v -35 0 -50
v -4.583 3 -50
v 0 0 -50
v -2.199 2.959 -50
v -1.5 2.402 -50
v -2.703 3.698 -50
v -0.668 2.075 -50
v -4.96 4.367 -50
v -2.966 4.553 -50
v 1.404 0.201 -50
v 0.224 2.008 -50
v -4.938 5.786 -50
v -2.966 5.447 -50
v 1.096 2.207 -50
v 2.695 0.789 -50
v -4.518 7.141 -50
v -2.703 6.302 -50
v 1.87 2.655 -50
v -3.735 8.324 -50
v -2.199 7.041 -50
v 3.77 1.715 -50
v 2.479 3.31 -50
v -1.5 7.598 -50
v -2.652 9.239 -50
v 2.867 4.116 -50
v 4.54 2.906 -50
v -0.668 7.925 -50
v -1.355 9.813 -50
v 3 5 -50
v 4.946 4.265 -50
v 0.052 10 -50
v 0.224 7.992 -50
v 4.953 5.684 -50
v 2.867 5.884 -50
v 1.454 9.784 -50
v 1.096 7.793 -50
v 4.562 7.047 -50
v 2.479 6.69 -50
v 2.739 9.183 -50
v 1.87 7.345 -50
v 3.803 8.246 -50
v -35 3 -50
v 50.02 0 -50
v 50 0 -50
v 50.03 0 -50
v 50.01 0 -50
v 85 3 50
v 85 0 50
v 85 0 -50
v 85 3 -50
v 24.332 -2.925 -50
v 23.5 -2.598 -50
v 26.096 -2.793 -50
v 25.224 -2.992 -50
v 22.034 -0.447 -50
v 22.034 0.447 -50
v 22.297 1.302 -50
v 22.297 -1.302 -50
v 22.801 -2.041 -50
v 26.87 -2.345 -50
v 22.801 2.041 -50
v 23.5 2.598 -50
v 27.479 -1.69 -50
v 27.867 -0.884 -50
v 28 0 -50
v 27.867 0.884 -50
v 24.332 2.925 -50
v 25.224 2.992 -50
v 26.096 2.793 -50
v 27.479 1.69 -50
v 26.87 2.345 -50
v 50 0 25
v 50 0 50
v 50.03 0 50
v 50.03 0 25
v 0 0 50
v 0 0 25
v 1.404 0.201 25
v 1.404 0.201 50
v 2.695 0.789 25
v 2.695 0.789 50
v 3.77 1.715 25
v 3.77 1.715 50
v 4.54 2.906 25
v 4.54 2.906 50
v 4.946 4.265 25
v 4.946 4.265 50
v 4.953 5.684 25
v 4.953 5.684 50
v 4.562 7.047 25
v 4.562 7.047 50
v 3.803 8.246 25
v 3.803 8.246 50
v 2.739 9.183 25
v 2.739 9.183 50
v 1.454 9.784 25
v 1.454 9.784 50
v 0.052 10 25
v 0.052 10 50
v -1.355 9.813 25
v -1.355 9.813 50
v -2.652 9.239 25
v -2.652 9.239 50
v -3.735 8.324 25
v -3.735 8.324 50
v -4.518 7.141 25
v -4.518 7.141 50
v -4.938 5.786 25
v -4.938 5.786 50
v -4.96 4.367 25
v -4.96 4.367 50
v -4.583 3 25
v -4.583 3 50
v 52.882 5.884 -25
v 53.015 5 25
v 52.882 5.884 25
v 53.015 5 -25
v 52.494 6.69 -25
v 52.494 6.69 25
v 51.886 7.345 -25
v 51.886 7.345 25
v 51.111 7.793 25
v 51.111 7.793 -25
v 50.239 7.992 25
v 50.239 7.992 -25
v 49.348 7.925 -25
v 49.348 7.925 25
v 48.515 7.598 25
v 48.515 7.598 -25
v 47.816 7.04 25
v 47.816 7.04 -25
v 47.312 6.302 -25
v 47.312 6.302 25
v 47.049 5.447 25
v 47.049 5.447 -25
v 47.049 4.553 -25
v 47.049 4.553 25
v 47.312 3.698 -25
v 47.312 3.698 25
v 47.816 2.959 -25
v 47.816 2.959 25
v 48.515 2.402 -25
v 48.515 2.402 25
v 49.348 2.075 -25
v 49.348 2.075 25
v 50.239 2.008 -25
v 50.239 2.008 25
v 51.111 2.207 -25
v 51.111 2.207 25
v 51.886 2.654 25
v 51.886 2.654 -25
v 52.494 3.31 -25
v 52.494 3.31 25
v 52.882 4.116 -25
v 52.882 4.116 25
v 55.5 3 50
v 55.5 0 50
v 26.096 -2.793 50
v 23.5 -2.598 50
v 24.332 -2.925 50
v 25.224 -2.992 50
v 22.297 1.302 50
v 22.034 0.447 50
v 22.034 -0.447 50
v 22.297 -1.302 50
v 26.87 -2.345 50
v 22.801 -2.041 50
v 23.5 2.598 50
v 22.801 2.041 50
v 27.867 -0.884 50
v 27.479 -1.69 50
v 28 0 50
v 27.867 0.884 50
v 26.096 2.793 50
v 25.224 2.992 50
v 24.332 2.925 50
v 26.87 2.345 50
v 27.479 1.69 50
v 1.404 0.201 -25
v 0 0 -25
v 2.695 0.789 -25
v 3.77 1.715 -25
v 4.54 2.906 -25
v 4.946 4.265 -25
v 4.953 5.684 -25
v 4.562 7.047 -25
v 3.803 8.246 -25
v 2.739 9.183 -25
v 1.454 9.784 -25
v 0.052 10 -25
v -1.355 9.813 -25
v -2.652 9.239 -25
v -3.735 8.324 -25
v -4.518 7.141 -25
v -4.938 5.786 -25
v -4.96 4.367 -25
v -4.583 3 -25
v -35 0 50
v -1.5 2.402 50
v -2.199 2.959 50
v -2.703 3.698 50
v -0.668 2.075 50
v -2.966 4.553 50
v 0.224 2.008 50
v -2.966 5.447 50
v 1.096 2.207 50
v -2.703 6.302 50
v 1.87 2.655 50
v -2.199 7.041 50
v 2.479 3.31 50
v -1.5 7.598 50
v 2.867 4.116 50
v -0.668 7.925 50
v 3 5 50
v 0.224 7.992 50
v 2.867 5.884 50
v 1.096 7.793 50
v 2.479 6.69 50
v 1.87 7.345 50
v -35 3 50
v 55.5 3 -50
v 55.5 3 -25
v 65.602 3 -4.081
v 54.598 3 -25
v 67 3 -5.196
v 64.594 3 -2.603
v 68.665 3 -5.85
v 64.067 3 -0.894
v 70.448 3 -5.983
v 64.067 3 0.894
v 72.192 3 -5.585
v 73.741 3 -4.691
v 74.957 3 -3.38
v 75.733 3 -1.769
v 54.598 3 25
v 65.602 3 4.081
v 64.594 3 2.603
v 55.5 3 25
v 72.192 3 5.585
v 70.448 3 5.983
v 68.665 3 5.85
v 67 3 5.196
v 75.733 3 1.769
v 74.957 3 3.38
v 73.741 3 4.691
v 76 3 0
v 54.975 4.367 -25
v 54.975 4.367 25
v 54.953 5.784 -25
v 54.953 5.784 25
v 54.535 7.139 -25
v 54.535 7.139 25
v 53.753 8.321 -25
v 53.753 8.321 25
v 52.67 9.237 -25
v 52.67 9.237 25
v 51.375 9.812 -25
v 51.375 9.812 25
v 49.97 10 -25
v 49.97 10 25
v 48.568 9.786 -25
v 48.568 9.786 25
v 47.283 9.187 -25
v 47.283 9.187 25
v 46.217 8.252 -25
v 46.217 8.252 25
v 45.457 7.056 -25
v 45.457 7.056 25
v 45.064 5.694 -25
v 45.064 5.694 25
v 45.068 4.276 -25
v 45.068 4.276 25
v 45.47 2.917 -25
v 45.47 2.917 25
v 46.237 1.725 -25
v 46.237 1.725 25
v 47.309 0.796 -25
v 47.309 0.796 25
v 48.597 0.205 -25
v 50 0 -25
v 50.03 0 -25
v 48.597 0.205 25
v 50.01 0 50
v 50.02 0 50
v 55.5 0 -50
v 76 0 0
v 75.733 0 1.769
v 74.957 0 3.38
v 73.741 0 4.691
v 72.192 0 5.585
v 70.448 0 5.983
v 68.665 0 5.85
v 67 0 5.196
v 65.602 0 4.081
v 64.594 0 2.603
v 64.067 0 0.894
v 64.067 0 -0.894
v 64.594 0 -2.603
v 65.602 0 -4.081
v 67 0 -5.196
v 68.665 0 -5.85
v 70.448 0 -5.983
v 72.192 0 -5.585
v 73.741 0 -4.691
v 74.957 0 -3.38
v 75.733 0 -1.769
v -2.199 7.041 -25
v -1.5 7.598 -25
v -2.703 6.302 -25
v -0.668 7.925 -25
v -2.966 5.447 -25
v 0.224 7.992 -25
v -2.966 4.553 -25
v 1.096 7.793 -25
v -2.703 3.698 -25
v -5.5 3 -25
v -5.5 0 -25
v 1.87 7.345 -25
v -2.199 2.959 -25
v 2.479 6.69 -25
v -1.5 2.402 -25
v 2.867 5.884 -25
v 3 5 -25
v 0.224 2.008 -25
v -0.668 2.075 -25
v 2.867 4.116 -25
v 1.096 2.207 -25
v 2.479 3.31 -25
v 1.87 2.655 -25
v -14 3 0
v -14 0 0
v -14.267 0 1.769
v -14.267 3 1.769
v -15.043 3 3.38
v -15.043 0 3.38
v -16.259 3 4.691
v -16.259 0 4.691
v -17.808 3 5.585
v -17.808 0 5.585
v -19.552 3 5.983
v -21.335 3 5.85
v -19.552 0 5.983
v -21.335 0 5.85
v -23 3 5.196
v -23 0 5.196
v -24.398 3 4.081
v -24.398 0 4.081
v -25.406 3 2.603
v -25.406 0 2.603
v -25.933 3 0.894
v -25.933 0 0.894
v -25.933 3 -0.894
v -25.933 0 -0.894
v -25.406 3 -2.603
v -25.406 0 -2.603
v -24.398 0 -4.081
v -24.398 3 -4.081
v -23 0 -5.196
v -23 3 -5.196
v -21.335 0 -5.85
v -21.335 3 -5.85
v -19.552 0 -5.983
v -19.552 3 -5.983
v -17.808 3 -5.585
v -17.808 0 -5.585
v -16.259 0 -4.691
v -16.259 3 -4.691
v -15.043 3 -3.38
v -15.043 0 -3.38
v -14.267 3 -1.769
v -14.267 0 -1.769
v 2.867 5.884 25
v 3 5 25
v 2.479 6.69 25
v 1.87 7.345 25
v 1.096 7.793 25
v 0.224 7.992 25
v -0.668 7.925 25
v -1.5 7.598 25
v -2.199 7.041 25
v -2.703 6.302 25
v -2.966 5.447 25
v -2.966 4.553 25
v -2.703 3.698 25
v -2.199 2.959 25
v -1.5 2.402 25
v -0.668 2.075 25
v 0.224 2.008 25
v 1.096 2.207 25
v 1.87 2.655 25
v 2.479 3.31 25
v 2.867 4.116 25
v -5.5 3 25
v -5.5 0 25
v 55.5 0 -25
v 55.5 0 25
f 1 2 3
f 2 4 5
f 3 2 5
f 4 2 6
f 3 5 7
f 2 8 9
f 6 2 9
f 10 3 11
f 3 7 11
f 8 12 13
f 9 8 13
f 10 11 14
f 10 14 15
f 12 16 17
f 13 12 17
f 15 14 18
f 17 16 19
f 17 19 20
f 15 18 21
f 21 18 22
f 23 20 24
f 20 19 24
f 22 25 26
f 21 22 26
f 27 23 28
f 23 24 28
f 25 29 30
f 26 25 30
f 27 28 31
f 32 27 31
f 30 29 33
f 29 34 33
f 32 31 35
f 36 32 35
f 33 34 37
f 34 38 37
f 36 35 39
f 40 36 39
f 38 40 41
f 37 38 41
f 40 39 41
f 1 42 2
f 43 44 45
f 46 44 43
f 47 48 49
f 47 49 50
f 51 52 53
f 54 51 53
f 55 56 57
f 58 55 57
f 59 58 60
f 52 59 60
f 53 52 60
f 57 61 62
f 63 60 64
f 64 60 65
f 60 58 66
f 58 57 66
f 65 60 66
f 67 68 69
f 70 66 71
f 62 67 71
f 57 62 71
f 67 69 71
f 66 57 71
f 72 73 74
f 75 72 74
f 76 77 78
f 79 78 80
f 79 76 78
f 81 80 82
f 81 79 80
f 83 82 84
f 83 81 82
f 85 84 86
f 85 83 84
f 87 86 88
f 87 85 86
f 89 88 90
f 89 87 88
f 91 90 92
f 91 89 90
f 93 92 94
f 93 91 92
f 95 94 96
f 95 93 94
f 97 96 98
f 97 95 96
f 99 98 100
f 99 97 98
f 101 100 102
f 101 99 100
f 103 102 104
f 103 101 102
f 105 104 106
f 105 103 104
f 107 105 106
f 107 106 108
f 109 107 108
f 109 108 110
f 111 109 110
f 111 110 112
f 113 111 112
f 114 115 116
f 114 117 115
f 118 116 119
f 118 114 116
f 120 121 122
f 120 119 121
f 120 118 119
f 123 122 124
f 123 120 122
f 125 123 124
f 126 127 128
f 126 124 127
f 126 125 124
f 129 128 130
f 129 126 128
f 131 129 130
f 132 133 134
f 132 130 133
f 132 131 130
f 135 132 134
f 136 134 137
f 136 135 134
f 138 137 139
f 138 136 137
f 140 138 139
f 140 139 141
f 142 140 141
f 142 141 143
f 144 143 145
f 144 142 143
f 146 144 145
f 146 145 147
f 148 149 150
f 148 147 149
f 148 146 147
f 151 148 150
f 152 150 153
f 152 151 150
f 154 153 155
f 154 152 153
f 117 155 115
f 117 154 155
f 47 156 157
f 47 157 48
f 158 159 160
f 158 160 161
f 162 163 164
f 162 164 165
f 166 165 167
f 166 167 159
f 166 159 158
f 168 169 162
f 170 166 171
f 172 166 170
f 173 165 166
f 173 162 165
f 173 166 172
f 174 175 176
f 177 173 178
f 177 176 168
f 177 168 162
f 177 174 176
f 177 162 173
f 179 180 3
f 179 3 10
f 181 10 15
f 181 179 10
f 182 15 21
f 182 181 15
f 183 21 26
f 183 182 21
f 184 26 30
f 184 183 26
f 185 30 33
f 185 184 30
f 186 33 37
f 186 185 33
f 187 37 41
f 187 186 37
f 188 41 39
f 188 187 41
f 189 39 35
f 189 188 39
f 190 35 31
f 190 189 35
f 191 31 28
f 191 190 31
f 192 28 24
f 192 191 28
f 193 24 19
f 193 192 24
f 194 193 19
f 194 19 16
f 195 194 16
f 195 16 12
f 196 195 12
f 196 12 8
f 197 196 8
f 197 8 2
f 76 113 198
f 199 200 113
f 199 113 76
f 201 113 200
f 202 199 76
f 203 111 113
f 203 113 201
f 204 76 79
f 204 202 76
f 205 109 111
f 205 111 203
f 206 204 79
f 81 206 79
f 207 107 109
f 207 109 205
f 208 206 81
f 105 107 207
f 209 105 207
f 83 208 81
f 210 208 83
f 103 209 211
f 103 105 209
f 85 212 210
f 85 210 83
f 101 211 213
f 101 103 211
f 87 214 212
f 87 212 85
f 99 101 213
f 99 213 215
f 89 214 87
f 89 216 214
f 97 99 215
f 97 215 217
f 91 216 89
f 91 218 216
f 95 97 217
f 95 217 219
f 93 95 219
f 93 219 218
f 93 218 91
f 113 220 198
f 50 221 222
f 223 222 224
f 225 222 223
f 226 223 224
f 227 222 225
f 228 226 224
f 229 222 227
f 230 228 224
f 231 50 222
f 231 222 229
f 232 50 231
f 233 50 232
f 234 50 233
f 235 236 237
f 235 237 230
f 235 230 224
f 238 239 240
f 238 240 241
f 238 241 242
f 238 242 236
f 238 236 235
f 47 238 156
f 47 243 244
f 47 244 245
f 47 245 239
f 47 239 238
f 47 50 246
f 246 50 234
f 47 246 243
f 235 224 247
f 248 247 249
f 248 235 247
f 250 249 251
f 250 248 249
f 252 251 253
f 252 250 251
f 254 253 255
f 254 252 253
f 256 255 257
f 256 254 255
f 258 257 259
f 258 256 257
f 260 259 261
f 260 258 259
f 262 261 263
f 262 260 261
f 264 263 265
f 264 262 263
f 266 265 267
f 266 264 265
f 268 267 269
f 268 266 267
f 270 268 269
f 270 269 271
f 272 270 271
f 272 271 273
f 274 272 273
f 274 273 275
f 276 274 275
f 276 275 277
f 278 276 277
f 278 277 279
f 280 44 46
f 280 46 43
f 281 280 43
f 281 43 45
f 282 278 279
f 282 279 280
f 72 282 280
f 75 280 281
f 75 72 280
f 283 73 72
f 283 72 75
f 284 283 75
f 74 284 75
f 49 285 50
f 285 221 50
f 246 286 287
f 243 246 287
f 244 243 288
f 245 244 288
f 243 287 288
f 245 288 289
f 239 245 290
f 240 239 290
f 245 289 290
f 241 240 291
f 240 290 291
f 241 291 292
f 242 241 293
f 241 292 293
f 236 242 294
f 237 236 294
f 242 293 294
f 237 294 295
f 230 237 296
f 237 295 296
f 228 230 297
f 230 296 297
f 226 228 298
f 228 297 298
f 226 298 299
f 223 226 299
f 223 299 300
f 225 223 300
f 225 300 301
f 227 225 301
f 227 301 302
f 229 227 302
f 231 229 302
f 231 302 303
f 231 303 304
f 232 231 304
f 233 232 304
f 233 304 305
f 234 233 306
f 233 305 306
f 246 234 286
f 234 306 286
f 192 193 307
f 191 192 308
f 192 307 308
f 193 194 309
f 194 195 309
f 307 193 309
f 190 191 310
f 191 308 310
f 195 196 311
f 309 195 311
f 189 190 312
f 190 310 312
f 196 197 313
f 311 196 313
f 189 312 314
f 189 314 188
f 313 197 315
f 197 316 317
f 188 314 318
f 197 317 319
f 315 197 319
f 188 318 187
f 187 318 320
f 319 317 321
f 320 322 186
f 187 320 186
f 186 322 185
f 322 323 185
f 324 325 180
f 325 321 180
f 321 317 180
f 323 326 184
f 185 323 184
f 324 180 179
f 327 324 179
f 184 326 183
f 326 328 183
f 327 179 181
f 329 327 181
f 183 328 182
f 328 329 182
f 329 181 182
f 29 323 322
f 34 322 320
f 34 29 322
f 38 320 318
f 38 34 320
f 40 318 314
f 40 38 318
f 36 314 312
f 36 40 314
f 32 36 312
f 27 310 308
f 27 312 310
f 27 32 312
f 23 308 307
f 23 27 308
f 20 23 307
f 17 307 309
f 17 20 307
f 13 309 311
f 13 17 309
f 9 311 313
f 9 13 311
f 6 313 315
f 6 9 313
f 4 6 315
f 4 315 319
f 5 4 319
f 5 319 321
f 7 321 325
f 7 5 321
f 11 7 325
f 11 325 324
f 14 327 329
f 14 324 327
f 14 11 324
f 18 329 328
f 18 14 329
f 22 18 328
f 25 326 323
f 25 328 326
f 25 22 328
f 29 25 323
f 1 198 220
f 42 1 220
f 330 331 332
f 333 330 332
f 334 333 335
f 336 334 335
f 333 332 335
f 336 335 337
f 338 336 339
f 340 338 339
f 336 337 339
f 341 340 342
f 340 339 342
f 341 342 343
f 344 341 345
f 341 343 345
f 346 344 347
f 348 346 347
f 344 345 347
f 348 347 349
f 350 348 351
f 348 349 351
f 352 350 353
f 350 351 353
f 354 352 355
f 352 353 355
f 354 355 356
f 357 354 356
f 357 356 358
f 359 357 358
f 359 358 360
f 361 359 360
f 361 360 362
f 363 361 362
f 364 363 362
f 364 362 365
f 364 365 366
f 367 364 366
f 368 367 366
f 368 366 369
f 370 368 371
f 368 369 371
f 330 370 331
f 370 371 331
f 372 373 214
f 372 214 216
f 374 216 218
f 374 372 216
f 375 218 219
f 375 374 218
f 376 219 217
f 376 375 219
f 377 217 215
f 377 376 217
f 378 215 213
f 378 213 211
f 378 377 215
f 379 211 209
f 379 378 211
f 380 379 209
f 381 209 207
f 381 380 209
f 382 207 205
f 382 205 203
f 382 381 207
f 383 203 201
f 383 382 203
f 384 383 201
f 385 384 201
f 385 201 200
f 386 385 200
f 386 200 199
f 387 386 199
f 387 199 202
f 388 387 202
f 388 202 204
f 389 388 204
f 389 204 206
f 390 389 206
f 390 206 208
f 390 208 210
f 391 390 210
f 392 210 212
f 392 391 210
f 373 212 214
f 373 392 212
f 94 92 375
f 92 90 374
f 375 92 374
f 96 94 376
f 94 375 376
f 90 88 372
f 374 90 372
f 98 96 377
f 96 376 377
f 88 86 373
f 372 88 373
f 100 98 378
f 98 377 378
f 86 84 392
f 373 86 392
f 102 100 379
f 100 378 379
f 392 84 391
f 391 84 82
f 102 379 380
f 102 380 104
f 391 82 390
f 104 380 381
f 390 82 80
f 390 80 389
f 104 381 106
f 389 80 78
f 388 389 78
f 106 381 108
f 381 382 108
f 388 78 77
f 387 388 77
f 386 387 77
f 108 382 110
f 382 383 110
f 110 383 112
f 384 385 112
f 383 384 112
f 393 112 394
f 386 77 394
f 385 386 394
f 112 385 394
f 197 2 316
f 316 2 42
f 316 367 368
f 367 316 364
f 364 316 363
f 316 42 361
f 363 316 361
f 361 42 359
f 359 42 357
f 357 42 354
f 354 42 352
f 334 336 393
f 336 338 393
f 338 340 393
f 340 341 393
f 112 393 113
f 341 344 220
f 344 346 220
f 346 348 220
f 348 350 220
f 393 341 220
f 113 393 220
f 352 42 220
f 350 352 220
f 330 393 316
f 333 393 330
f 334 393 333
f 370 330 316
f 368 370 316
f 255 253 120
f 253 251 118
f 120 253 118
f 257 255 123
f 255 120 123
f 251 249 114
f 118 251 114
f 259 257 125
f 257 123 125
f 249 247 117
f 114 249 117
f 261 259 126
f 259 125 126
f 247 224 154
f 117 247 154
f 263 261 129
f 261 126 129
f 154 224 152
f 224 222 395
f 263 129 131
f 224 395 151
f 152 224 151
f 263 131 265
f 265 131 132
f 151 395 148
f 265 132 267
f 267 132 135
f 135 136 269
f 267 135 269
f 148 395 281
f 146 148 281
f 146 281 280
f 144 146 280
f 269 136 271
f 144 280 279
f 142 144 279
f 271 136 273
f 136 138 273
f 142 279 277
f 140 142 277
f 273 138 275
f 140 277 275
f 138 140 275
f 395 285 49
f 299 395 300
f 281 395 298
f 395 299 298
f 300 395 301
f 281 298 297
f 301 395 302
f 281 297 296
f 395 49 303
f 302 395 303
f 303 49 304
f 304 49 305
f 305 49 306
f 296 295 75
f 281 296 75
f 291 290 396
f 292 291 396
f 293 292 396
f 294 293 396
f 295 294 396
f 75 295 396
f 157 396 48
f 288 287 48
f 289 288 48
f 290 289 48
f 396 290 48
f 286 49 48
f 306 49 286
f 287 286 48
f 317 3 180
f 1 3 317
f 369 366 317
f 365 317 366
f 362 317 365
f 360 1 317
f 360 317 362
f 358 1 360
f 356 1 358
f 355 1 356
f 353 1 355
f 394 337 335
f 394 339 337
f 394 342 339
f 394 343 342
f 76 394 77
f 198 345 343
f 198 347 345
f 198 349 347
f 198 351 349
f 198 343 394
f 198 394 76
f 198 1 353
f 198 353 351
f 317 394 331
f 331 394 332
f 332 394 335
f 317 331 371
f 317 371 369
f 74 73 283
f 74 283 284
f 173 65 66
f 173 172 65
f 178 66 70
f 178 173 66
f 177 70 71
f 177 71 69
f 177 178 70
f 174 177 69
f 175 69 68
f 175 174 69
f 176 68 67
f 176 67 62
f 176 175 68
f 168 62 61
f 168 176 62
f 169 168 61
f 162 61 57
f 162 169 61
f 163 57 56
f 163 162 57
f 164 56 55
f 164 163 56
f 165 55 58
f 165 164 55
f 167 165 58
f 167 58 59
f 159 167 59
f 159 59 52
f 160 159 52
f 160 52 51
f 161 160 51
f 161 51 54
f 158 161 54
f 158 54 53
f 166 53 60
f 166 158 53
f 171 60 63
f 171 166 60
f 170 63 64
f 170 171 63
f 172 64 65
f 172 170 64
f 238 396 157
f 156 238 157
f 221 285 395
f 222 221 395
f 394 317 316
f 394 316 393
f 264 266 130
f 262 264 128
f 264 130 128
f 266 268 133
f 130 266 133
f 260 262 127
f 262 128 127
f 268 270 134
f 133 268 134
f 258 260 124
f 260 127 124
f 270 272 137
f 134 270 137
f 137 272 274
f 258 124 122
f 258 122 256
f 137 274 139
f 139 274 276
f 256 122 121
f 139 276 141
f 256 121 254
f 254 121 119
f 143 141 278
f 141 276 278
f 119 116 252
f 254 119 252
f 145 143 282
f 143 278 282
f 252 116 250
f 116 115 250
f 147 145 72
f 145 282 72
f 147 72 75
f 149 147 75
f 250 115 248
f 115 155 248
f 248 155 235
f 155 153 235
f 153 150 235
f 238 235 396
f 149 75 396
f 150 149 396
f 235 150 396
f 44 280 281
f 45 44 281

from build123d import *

# Parameters (mm, degrees)
F1_R      = 5
F1_R_2    = 3
F2_DEPTH  = 50
F4_W      = 3
F4_H      = 100
F0_R      = 6
F6_DEPTH  = 3
F0_W      = 5.5
F0_H      = 50
F7_DEPTH  = 11
F10_R     = 5
F10_R_2   = 3
F11_DEPTH = 50
F13_W     = 3
F13_H     = 100
F9_R      = 6
F15_DEPTH = 3
F9_W      = 5.5
F9_H      = 25
F16_DEPTH = 11
F18_R     = 3
F19_DEPTH = 50


with BuildPart() as f2:
    # F1 (on Top) → F2 (new body, symmetric)
    with BuildSketch(Plane.XY):
        with Locations((0, 5)):
            Circle(F1_R)
        with Locations((0, 5)):
            Circle(F1_R_2, mode=Mode.SUBTRACT)
    extrude(amount=F2_DEPTH, both=True)

    # F4 (on offset) → F5 (join, up to the next surface of F2)
    with BuildSketch(Plane.YZ.offset(-35)):
        with Locations((1.5, 0)):
            Rectangle(F4_W, F4_H)
    extrude(until=Until.NEXT)

    # F0 (on Front) → F6 (cut, through all)
    with BuildSketch(Plane.XZ):
        with Locations((-20, 0)):
            Circle(F0_R)
    extrude(amount=-F6_DEPTH, mode=Mode.SUBTRACT)

    # F0 (on Front) → F7 (cut)
    with BuildSketch(Plane.XZ):
        with Locations((2.75, 0)):
            Rectangle(F0_W, F0_H)
        with Locations((-2.75, 0)):
            Rectangle(F0_W, F0_H)
    extrude(amount=-F7_DEPTH, mode=Mode.SUBTRACT)


with BuildPart() as f11:
    # F10 (on Top) → F11 (new body, symmetric)
    with BuildSketch(Plane.XY):
        with Locations((50.0151987175, 4.9999768998)):
            Circle(F10_R)
        with Locations((50.0151987175, 4.9999768998)):
            Circle(F10_R_2, mode=Mode.SUBTRACT)
    extrude(amount=F11_DEPTH, both=True)

    # F13 (on offset) → F14 (join, up to the next surface of F11)
    with BuildSketch(Plane.YZ.offset(85)):
        with Locations((1.5, 0)):
            Rectangle(F13_W, F13_H)
    extrude(until=Until.NEXT, dir=(-1, 0, 0))

    # F9 (on Front) → F15 (cut, through all)
    with BuildSketch(Plane.XZ):
        with Locations((70, 0)):
            Circle(F9_R)
    extrude(amount=-F15_DEPTH, mode=Mode.SUBTRACT)

    # F9 (on Front) → F16 (cut)
    with BuildSketch(Plane.XZ):
        with Locations((47.25, -37.5)):
            Rectangle(F9_W, F9_H)
        with Locations((47.25, 37.5)):
            Rectangle(F9_W, F9_H)
        with Locations((52.75, 37.5)):
            Rectangle(F9_W, F9_H)
        with Locations((52.75, -37.5)):
            Rectangle(F9_W, F9_H)
    extrude(amount=-F16_DEPTH, mode=Mode.SUBTRACT)


with BuildPart() as f19:
    # F18 (on Top) → F19 (new body, symmetric)
    with BuildSketch(Plane.XY):
        with Locations((25, 0)):
            Circle(F18_R)
    extrude(amount=F19_DEPTH, both=True)


solid = Compound([f2.part, f11.part, f19.part])
